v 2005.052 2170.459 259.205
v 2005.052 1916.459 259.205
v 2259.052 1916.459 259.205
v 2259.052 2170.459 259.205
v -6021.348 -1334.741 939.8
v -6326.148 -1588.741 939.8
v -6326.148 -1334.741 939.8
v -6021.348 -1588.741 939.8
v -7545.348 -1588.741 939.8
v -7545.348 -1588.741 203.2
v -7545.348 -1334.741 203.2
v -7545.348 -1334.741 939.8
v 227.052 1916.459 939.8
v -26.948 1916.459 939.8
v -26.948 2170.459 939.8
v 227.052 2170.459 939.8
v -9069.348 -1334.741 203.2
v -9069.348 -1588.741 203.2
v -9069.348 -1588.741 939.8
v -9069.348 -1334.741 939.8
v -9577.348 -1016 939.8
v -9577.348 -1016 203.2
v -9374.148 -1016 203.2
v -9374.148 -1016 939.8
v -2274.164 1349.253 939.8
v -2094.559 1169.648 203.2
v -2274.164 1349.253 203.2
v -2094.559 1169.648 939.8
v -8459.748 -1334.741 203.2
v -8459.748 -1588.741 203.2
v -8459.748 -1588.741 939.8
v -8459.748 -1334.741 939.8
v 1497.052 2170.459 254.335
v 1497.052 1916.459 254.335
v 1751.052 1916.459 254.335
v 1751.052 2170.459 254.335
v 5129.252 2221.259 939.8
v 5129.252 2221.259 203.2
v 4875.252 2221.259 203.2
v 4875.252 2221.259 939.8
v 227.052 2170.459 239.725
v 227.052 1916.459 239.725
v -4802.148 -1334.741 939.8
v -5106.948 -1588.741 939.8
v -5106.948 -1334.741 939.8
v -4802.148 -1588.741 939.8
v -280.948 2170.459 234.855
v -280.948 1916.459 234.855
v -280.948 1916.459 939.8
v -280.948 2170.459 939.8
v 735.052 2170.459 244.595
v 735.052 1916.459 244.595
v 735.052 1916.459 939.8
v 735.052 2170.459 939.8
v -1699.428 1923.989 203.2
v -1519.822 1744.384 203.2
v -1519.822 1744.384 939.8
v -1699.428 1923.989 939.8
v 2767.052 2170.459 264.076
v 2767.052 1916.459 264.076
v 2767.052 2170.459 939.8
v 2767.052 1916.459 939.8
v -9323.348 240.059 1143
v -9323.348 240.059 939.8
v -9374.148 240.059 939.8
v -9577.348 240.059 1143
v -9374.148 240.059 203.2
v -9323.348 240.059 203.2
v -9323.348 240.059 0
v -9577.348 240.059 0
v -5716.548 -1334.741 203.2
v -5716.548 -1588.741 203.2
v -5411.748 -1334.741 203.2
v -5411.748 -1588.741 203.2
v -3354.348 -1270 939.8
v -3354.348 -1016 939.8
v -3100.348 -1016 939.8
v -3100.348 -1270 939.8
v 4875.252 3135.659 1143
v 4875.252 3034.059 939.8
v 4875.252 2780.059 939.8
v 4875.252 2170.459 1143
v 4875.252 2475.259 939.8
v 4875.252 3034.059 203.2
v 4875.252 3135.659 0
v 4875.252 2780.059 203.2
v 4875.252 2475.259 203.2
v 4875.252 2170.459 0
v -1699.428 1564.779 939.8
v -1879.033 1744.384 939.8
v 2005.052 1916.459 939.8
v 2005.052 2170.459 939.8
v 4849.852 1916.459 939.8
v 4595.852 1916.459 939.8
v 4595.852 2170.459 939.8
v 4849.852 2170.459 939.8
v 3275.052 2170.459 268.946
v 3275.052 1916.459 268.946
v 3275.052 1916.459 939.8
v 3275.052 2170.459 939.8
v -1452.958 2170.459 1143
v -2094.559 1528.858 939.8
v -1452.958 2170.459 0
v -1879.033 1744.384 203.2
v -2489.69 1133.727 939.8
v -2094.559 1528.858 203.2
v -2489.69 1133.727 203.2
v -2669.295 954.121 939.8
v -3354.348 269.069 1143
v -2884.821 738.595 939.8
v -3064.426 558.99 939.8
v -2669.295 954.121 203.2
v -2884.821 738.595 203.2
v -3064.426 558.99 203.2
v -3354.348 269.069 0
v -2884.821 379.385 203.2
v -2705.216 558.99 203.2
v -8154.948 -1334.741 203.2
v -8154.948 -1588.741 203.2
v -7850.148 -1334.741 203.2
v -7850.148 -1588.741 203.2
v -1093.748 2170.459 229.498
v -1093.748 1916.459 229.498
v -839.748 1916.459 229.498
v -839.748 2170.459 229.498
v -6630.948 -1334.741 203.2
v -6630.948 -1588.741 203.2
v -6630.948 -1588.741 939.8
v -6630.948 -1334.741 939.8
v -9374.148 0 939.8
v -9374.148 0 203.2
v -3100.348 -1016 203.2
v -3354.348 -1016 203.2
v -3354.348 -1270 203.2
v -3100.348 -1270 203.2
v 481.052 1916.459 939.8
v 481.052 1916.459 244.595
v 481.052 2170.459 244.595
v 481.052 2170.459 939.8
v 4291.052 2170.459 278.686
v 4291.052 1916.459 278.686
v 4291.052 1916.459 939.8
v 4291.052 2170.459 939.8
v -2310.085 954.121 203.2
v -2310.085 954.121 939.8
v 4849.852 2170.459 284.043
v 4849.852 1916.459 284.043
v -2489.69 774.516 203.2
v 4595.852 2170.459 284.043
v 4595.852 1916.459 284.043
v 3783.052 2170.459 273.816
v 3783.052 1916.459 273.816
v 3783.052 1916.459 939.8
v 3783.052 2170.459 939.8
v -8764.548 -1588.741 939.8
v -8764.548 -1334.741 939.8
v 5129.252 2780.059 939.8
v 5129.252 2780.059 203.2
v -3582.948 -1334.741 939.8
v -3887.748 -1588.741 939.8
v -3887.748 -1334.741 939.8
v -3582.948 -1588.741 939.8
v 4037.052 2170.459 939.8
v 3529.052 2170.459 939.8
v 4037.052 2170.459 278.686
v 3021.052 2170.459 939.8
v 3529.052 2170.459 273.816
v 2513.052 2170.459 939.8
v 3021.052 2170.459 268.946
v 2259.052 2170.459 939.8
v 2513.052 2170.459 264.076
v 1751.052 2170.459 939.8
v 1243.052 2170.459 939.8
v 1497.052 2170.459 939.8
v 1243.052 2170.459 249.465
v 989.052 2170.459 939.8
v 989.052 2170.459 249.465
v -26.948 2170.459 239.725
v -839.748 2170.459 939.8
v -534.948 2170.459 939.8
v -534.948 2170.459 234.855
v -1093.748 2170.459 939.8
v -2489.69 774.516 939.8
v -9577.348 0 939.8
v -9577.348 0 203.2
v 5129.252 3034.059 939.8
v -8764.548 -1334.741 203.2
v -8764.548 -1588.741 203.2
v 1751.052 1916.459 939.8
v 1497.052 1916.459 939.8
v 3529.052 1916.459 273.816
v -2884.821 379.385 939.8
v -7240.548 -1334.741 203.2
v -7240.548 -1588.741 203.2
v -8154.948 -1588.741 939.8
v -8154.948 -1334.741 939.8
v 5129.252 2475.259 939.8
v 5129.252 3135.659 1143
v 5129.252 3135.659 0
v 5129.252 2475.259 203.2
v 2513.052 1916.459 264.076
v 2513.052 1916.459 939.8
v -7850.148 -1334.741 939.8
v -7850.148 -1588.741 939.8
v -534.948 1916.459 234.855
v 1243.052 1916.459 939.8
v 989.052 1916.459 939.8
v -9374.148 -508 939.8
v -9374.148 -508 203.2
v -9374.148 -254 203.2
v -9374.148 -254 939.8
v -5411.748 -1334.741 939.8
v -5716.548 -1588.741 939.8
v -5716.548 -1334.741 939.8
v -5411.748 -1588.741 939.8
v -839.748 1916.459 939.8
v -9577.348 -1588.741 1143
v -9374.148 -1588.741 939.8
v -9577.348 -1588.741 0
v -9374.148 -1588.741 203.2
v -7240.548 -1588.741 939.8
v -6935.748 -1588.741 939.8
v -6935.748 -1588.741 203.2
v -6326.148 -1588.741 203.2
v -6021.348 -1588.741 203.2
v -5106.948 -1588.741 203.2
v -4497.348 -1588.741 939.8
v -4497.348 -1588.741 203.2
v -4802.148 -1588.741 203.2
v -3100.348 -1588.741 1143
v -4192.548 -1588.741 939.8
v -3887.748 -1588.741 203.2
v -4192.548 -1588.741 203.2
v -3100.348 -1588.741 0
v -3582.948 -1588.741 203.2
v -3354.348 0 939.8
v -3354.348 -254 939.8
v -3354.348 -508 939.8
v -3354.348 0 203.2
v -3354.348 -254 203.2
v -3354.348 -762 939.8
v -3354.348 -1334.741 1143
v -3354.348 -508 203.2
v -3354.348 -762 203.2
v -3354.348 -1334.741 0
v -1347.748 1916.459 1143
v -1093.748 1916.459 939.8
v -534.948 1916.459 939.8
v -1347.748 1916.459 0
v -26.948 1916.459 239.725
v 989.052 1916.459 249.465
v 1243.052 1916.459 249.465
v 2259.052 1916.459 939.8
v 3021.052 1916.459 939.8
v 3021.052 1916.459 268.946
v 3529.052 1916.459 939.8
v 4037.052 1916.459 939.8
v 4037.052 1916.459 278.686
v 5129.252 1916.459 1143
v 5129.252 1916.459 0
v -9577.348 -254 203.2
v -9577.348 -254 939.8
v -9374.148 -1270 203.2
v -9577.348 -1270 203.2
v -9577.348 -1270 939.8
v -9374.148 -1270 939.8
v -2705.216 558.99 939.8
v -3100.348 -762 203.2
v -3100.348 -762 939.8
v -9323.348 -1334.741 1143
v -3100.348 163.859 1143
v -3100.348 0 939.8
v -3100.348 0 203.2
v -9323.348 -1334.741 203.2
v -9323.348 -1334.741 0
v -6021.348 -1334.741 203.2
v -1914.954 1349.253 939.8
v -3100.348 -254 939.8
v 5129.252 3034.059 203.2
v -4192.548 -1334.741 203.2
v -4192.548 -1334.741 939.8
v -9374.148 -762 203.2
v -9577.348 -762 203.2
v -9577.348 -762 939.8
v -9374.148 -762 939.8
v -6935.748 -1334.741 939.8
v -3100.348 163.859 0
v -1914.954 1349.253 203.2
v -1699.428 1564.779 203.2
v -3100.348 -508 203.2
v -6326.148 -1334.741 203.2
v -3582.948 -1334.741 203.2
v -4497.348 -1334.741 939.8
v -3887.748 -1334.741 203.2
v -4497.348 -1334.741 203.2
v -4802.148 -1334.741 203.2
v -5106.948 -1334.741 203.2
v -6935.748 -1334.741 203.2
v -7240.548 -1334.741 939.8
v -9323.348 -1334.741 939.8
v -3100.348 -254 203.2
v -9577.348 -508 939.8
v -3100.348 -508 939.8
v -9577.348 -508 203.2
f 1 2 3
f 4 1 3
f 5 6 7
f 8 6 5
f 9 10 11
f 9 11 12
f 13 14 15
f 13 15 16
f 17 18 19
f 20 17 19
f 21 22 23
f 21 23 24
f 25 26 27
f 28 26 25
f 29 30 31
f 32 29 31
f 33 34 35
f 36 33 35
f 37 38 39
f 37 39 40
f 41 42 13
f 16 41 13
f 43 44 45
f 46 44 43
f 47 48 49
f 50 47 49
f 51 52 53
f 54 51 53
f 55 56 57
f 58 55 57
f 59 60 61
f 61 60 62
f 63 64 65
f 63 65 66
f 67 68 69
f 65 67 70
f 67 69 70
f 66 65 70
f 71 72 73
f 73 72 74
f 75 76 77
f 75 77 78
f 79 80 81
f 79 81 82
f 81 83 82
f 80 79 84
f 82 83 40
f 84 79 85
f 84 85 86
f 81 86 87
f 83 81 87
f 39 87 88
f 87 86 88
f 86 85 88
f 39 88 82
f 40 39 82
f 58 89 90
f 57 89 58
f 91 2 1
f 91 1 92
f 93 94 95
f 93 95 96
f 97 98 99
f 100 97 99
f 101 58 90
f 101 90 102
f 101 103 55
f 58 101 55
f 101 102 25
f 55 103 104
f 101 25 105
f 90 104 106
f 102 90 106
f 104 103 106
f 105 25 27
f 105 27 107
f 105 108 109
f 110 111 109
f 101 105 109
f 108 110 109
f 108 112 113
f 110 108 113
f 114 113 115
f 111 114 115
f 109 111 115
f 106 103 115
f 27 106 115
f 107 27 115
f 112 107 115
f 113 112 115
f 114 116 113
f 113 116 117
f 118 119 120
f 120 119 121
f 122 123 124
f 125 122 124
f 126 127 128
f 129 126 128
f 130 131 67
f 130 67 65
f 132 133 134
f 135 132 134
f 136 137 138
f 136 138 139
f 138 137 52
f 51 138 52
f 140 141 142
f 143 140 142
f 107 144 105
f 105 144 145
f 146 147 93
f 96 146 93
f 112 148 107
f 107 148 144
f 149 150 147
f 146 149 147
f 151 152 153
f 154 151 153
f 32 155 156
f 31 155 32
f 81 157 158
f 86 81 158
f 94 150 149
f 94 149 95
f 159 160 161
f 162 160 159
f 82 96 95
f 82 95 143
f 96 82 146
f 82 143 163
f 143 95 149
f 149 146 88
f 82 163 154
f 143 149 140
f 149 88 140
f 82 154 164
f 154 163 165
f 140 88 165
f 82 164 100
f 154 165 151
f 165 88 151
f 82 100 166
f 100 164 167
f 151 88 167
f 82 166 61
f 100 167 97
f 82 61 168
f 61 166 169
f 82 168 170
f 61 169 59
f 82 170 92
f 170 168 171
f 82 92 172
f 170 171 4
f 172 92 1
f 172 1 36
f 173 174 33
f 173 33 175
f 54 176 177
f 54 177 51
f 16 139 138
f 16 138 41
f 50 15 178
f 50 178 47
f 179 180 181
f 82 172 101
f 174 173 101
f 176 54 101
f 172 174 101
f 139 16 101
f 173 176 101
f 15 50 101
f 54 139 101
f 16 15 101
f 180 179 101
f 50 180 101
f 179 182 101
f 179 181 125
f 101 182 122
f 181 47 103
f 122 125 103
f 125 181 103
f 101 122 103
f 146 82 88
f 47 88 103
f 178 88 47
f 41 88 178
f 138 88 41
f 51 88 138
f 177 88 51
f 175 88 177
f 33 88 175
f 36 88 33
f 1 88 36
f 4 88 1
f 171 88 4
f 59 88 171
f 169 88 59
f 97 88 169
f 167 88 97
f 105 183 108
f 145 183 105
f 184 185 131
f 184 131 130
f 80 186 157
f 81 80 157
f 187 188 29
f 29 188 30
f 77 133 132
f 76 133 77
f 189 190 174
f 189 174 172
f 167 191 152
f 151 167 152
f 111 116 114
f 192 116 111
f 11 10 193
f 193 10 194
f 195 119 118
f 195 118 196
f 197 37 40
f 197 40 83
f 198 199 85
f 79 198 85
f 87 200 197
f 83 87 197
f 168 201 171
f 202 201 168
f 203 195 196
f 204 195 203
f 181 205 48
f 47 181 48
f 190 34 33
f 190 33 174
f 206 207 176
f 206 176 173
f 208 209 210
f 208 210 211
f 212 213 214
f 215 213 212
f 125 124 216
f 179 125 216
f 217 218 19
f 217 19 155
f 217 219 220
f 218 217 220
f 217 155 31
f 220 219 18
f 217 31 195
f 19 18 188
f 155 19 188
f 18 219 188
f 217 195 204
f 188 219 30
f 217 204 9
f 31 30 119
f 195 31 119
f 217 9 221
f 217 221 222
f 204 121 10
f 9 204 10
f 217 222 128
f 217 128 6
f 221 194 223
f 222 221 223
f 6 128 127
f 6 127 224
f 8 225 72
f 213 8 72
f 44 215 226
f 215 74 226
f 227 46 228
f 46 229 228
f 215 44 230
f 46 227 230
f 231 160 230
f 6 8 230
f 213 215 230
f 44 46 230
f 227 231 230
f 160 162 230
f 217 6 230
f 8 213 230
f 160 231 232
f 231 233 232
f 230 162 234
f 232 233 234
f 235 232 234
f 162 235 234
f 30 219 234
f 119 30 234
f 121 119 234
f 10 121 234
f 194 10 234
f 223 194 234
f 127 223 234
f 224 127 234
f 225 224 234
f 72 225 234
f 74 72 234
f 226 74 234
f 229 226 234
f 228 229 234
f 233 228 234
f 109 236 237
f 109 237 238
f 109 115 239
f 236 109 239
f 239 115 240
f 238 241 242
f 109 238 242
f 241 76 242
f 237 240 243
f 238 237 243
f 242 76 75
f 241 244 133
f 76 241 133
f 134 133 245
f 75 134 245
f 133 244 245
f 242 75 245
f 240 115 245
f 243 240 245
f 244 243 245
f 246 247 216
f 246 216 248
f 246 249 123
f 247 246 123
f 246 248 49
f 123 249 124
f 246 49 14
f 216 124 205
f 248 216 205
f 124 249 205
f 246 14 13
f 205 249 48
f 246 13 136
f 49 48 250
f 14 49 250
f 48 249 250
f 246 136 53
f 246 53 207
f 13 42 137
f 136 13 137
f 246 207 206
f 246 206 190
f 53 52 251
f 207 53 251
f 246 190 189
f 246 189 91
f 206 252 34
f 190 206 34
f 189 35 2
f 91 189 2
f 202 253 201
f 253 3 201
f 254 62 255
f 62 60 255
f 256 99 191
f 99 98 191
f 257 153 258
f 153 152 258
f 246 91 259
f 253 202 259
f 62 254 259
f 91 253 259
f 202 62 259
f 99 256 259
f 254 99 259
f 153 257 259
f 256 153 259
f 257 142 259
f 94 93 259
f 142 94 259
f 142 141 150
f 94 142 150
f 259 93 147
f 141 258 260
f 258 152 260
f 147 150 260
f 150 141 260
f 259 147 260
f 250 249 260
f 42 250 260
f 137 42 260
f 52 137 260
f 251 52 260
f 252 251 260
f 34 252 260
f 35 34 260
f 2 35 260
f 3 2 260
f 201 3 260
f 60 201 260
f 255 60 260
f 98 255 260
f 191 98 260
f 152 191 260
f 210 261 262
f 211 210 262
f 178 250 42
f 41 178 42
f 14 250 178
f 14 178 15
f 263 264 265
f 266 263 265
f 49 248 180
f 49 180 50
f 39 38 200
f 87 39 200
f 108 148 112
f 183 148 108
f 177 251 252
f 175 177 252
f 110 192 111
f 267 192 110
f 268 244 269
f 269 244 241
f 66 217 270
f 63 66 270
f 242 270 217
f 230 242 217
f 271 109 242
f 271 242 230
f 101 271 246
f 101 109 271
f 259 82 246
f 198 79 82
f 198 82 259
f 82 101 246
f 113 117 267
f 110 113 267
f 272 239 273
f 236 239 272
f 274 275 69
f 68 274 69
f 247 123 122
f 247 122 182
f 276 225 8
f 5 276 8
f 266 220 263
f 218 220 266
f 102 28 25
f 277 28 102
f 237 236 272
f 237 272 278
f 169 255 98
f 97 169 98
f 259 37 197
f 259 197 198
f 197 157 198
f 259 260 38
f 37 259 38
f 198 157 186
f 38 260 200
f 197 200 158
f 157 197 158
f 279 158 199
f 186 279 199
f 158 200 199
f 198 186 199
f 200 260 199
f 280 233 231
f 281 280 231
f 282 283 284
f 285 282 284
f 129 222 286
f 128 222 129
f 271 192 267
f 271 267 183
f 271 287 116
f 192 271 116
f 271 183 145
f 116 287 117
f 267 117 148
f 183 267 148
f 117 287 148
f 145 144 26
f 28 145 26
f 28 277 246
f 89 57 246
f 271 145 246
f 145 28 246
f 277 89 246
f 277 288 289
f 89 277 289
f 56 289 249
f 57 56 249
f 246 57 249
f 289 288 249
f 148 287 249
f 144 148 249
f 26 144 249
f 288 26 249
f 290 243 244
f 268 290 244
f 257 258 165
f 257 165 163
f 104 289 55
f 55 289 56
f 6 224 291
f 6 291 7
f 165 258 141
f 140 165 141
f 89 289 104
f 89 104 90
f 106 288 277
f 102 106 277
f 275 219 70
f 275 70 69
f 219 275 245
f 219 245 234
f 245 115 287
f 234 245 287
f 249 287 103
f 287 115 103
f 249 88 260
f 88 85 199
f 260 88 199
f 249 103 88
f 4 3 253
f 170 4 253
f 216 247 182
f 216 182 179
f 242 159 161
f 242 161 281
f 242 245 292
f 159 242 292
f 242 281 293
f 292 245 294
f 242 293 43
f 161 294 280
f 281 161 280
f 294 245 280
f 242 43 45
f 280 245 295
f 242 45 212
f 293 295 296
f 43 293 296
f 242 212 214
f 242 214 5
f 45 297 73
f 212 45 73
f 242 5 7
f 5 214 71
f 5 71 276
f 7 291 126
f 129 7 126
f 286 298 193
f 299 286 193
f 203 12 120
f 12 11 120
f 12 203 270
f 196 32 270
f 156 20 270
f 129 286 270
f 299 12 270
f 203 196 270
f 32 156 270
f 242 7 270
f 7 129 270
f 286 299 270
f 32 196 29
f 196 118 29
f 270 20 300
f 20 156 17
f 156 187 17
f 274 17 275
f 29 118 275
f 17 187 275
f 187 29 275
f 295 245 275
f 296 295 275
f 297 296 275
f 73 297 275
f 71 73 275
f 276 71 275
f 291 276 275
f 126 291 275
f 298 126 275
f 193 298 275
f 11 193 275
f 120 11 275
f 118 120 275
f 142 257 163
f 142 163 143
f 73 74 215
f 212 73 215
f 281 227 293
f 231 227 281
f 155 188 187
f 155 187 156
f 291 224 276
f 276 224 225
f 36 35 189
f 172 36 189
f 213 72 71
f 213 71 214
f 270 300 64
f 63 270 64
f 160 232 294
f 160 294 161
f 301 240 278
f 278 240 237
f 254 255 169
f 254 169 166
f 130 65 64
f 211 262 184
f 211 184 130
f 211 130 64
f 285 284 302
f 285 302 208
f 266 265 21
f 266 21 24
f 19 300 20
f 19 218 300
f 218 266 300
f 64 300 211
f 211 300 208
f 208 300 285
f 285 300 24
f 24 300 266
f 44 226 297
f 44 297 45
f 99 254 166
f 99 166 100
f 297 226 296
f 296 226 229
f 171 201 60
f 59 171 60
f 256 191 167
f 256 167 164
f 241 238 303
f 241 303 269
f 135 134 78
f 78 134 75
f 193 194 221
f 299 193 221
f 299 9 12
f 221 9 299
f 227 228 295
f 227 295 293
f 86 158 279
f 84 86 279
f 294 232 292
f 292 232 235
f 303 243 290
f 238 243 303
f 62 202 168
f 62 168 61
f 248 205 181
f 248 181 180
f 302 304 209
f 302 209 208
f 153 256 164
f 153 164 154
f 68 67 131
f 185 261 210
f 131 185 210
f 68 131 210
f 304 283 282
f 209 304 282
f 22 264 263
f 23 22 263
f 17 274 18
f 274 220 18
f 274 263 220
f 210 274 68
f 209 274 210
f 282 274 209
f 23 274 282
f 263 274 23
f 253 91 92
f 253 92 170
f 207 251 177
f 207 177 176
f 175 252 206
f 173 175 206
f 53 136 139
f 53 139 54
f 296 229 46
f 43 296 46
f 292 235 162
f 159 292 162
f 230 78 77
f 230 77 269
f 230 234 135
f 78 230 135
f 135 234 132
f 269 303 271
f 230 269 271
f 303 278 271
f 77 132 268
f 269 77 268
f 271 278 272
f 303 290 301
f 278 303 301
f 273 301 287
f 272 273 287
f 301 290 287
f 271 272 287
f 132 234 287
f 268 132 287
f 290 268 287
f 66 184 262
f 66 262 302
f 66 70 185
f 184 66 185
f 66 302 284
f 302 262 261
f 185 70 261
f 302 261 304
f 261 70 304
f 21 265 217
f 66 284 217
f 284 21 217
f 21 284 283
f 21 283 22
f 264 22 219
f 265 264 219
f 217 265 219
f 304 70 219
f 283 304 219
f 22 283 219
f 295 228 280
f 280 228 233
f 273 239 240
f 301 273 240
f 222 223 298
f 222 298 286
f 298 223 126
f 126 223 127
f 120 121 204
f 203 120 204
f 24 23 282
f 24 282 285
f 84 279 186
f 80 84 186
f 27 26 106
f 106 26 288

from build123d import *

# Parameters (mm, degrees)
F1_DEPTH = 1143
F2_W     = 304.8
F2_H     = 736.6
F2_W_2   = 254
F2_H_2   = 710.3017836387
F2_H_3   = 704.944739572
F2_H_4   = 700.0746995114
F2_H_5   = 695.2046594508
F2_H_6   = 690.3346193901
F2_H_7   = 685.4645793295
F2_H_8   = 680.5945392688
F2_H_9   = 675.7244992082
F2_H_10  = 670.8544591476
F2_H_11  = 665.9844190869
F2_H_12  = 661.1143790263
F2_H_13  = 655.7573349596
F3_DEPTH = 4734.56
F4_W     = 254
F4_H     = 736.6
F5_DEPTH = 584.2
F6_W     = 254
F6_H     = 736.6
F7_DEPTH = 7112
F8_W     = 254
F8_H     = 736.6
F9_DEPTH = 304.8


with BuildPart() as f1:
    # F0 (on Top) → F1 (new body)
    with BuildSketch(Plane.XY):
        Polygon((-9577.3475189209, -1334.7411094666), (-9577.3475189209, -1588.7411094666), (-9323.3475189209, -1588.7411094666), (-3100.3475189209, -1588.7411094666), (-3100.3475189209, 163.8588905334), (-1347.747515396, 1916.4588940583), (5129.252484604, 1916.4588940583), (5129.252484604, 3135.6588940583), (4875.252484604, 3135.6588940583), (4875.252484604, 2170.4588940583), (-1452.9577602388, 2170.4588940583), (-3354.3475189209, 269.0691353762), (-3354.3475189209, -1334.7411094666), (-9323.3475189209, -1334.7411094666), (-9323.3475189209, 240.0588905334), (-9577.3475189209, 240.0588905334), align=None)
    extrude(amount=F1_DEPTH)

    # F2 (on face) → F3 (cut)
    with BuildSketch(Plane.XZ.offset(1588.7411094666)):
        with Locations((-9221.7475189209, 571.5)):
            Rectangle(F2_W, F2_H)
        with Locations((-8612.1475189209, 571.5)):
            Rectangle(F2_W, F2_H)
        with Locations((-8002.5475189209, 571.5)):
            Rectangle(F2_W, F2_H)
        with Locations((-7392.9475189209, 571.5)):
            Rectangle(F2_W, F2_H)
        with Locations((-6783.3475189209, 571.5)):
            Rectangle(F2_W, F2_H)
        with Locations((-6173.7475189209, 571.5)):
            Rectangle(F2_W, F2_H)
        with Locations((-5564.1475189209, 571.5)):
            Rectangle(F2_W, F2_H)
        with Locations((-4954.5475189209, 571.5)):
            Rectangle(F2_W, F2_H)
        with Locations((-4344.9475189209, 571.5)):
            Rectangle(F2_W, F2_H)
        with Locations((-3735.3475189209, 571.5)):
            Rectangle(F2_W, F2_H)
        with Locations((-966.747515396, 584.6491081806)):
            Rectangle(F2_W_2, F2_H_2)
        with Locations((-407.947515396, 587.327630214)):
            Rectangle(F2_W_2, F2_H_3)
        with Locations((100.052484604, 589.7626502443)):
            Rectangle(F2_W_2, F2_H_4)
        with Locations((608.052484604, 592.1976702746)):
            Rectangle(F2_W_2, F2_H_5)
        with Locations((1116.052484604, 594.6326903049)):
            Rectangle(F2_W_2, F2_H_6)
        with Locations((1624.052484604, 597.0677103353)):
            Rectangle(F2_W_2, F2_H_7)
        with Locations((2132.052484604, 599.5027303656)):
            Rectangle(F2_W_2, F2_H_8)
        with Locations((2640.052484604, 601.9377503959)):
            Rectangle(F2_W_2, F2_H_9)
        with Locations((3148.052484604, 604.3727704262)):
            Rectangle(F2_W_2, F2_H_10)
        with Locations((3656.052484604, 606.8077904565)):
            Rectangle(F2_W_2, F2_H_11)
        with Locations((4164.052484604, 609.2428104869)):
            Rectangle(F2_W_2, F2_H_12)
        with Locations((4722.852484604, 611.9213325202)):
            Rectangle(F2_W_2, F2_H_13)
    extrude(amount=-F3_DEPTH, mode=Mode.SUBTRACT)

    # F4 (on face) → F5 (cut)
    with BuildSketch(Plane(origin=(-1632.1032047272, 1632.1032047272, 0), x_dir=(0.7071067812, 0.7071067812, 0), z_dir=(0.7071067812, -0.7071067812, 0))):
        with Locations((-1644.61102201, 571.5)):
            Rectangle(F4_W, F4_H)
        with Locations((-1085.81102201, 571.5)):
            Rectangle(F4_W, F4_H)
        with Locations((-527.01102201, 571.5)):
            Rectangle(F4_W, F4_H)
        with Locations((31.78897799, 571.5)):
            Rectangle(F4_W, F4_H)
    extrude(amount=-F5_DEPTH, mode=Mode.SUBTRACT)

    # F6 (on face) → F7 (cut)
    with BuildSketch(Plane(origin=(-9577.3475189209, 0, 0), x_dir=(0, -1, 0), z_dir=(-1, 0, 0))):
        with Locations((127, 571.5)):
            Rectangle(F6_W, F6_H)
        with Locations((635, 571.5)):
            Rectangle(F6_W, F6_H)
        with Locations((1143, 571.5)):
            Rectangle(F6_W, F6_H)
    extrude(amount=-F7_DEPTH, mode=Mode.SUBTRACT)

    # F8 (on face) → F9 (cut)
    with BuildSketch(Plane.YZ.offset(5129.252484604)):
        with Locations((2348.2588940583, 571.5)):
            Rectangle(F8_W, F8_H)
        Polygon((2845.7119464874, 939.8), (2780.0588940583, 939.8), (2780.0588940583, 203.2), (2845.7119464874, 203.2), (3011.191368103, 203.2), (3034.0588940583, 203.2), (3034.0588940583, 939.8), (3011.191368103, 939.8), align=None)
    extrude(amount=-F9_DEPTH, mode=Mode.SUBTRACT)


solid = f1.part
